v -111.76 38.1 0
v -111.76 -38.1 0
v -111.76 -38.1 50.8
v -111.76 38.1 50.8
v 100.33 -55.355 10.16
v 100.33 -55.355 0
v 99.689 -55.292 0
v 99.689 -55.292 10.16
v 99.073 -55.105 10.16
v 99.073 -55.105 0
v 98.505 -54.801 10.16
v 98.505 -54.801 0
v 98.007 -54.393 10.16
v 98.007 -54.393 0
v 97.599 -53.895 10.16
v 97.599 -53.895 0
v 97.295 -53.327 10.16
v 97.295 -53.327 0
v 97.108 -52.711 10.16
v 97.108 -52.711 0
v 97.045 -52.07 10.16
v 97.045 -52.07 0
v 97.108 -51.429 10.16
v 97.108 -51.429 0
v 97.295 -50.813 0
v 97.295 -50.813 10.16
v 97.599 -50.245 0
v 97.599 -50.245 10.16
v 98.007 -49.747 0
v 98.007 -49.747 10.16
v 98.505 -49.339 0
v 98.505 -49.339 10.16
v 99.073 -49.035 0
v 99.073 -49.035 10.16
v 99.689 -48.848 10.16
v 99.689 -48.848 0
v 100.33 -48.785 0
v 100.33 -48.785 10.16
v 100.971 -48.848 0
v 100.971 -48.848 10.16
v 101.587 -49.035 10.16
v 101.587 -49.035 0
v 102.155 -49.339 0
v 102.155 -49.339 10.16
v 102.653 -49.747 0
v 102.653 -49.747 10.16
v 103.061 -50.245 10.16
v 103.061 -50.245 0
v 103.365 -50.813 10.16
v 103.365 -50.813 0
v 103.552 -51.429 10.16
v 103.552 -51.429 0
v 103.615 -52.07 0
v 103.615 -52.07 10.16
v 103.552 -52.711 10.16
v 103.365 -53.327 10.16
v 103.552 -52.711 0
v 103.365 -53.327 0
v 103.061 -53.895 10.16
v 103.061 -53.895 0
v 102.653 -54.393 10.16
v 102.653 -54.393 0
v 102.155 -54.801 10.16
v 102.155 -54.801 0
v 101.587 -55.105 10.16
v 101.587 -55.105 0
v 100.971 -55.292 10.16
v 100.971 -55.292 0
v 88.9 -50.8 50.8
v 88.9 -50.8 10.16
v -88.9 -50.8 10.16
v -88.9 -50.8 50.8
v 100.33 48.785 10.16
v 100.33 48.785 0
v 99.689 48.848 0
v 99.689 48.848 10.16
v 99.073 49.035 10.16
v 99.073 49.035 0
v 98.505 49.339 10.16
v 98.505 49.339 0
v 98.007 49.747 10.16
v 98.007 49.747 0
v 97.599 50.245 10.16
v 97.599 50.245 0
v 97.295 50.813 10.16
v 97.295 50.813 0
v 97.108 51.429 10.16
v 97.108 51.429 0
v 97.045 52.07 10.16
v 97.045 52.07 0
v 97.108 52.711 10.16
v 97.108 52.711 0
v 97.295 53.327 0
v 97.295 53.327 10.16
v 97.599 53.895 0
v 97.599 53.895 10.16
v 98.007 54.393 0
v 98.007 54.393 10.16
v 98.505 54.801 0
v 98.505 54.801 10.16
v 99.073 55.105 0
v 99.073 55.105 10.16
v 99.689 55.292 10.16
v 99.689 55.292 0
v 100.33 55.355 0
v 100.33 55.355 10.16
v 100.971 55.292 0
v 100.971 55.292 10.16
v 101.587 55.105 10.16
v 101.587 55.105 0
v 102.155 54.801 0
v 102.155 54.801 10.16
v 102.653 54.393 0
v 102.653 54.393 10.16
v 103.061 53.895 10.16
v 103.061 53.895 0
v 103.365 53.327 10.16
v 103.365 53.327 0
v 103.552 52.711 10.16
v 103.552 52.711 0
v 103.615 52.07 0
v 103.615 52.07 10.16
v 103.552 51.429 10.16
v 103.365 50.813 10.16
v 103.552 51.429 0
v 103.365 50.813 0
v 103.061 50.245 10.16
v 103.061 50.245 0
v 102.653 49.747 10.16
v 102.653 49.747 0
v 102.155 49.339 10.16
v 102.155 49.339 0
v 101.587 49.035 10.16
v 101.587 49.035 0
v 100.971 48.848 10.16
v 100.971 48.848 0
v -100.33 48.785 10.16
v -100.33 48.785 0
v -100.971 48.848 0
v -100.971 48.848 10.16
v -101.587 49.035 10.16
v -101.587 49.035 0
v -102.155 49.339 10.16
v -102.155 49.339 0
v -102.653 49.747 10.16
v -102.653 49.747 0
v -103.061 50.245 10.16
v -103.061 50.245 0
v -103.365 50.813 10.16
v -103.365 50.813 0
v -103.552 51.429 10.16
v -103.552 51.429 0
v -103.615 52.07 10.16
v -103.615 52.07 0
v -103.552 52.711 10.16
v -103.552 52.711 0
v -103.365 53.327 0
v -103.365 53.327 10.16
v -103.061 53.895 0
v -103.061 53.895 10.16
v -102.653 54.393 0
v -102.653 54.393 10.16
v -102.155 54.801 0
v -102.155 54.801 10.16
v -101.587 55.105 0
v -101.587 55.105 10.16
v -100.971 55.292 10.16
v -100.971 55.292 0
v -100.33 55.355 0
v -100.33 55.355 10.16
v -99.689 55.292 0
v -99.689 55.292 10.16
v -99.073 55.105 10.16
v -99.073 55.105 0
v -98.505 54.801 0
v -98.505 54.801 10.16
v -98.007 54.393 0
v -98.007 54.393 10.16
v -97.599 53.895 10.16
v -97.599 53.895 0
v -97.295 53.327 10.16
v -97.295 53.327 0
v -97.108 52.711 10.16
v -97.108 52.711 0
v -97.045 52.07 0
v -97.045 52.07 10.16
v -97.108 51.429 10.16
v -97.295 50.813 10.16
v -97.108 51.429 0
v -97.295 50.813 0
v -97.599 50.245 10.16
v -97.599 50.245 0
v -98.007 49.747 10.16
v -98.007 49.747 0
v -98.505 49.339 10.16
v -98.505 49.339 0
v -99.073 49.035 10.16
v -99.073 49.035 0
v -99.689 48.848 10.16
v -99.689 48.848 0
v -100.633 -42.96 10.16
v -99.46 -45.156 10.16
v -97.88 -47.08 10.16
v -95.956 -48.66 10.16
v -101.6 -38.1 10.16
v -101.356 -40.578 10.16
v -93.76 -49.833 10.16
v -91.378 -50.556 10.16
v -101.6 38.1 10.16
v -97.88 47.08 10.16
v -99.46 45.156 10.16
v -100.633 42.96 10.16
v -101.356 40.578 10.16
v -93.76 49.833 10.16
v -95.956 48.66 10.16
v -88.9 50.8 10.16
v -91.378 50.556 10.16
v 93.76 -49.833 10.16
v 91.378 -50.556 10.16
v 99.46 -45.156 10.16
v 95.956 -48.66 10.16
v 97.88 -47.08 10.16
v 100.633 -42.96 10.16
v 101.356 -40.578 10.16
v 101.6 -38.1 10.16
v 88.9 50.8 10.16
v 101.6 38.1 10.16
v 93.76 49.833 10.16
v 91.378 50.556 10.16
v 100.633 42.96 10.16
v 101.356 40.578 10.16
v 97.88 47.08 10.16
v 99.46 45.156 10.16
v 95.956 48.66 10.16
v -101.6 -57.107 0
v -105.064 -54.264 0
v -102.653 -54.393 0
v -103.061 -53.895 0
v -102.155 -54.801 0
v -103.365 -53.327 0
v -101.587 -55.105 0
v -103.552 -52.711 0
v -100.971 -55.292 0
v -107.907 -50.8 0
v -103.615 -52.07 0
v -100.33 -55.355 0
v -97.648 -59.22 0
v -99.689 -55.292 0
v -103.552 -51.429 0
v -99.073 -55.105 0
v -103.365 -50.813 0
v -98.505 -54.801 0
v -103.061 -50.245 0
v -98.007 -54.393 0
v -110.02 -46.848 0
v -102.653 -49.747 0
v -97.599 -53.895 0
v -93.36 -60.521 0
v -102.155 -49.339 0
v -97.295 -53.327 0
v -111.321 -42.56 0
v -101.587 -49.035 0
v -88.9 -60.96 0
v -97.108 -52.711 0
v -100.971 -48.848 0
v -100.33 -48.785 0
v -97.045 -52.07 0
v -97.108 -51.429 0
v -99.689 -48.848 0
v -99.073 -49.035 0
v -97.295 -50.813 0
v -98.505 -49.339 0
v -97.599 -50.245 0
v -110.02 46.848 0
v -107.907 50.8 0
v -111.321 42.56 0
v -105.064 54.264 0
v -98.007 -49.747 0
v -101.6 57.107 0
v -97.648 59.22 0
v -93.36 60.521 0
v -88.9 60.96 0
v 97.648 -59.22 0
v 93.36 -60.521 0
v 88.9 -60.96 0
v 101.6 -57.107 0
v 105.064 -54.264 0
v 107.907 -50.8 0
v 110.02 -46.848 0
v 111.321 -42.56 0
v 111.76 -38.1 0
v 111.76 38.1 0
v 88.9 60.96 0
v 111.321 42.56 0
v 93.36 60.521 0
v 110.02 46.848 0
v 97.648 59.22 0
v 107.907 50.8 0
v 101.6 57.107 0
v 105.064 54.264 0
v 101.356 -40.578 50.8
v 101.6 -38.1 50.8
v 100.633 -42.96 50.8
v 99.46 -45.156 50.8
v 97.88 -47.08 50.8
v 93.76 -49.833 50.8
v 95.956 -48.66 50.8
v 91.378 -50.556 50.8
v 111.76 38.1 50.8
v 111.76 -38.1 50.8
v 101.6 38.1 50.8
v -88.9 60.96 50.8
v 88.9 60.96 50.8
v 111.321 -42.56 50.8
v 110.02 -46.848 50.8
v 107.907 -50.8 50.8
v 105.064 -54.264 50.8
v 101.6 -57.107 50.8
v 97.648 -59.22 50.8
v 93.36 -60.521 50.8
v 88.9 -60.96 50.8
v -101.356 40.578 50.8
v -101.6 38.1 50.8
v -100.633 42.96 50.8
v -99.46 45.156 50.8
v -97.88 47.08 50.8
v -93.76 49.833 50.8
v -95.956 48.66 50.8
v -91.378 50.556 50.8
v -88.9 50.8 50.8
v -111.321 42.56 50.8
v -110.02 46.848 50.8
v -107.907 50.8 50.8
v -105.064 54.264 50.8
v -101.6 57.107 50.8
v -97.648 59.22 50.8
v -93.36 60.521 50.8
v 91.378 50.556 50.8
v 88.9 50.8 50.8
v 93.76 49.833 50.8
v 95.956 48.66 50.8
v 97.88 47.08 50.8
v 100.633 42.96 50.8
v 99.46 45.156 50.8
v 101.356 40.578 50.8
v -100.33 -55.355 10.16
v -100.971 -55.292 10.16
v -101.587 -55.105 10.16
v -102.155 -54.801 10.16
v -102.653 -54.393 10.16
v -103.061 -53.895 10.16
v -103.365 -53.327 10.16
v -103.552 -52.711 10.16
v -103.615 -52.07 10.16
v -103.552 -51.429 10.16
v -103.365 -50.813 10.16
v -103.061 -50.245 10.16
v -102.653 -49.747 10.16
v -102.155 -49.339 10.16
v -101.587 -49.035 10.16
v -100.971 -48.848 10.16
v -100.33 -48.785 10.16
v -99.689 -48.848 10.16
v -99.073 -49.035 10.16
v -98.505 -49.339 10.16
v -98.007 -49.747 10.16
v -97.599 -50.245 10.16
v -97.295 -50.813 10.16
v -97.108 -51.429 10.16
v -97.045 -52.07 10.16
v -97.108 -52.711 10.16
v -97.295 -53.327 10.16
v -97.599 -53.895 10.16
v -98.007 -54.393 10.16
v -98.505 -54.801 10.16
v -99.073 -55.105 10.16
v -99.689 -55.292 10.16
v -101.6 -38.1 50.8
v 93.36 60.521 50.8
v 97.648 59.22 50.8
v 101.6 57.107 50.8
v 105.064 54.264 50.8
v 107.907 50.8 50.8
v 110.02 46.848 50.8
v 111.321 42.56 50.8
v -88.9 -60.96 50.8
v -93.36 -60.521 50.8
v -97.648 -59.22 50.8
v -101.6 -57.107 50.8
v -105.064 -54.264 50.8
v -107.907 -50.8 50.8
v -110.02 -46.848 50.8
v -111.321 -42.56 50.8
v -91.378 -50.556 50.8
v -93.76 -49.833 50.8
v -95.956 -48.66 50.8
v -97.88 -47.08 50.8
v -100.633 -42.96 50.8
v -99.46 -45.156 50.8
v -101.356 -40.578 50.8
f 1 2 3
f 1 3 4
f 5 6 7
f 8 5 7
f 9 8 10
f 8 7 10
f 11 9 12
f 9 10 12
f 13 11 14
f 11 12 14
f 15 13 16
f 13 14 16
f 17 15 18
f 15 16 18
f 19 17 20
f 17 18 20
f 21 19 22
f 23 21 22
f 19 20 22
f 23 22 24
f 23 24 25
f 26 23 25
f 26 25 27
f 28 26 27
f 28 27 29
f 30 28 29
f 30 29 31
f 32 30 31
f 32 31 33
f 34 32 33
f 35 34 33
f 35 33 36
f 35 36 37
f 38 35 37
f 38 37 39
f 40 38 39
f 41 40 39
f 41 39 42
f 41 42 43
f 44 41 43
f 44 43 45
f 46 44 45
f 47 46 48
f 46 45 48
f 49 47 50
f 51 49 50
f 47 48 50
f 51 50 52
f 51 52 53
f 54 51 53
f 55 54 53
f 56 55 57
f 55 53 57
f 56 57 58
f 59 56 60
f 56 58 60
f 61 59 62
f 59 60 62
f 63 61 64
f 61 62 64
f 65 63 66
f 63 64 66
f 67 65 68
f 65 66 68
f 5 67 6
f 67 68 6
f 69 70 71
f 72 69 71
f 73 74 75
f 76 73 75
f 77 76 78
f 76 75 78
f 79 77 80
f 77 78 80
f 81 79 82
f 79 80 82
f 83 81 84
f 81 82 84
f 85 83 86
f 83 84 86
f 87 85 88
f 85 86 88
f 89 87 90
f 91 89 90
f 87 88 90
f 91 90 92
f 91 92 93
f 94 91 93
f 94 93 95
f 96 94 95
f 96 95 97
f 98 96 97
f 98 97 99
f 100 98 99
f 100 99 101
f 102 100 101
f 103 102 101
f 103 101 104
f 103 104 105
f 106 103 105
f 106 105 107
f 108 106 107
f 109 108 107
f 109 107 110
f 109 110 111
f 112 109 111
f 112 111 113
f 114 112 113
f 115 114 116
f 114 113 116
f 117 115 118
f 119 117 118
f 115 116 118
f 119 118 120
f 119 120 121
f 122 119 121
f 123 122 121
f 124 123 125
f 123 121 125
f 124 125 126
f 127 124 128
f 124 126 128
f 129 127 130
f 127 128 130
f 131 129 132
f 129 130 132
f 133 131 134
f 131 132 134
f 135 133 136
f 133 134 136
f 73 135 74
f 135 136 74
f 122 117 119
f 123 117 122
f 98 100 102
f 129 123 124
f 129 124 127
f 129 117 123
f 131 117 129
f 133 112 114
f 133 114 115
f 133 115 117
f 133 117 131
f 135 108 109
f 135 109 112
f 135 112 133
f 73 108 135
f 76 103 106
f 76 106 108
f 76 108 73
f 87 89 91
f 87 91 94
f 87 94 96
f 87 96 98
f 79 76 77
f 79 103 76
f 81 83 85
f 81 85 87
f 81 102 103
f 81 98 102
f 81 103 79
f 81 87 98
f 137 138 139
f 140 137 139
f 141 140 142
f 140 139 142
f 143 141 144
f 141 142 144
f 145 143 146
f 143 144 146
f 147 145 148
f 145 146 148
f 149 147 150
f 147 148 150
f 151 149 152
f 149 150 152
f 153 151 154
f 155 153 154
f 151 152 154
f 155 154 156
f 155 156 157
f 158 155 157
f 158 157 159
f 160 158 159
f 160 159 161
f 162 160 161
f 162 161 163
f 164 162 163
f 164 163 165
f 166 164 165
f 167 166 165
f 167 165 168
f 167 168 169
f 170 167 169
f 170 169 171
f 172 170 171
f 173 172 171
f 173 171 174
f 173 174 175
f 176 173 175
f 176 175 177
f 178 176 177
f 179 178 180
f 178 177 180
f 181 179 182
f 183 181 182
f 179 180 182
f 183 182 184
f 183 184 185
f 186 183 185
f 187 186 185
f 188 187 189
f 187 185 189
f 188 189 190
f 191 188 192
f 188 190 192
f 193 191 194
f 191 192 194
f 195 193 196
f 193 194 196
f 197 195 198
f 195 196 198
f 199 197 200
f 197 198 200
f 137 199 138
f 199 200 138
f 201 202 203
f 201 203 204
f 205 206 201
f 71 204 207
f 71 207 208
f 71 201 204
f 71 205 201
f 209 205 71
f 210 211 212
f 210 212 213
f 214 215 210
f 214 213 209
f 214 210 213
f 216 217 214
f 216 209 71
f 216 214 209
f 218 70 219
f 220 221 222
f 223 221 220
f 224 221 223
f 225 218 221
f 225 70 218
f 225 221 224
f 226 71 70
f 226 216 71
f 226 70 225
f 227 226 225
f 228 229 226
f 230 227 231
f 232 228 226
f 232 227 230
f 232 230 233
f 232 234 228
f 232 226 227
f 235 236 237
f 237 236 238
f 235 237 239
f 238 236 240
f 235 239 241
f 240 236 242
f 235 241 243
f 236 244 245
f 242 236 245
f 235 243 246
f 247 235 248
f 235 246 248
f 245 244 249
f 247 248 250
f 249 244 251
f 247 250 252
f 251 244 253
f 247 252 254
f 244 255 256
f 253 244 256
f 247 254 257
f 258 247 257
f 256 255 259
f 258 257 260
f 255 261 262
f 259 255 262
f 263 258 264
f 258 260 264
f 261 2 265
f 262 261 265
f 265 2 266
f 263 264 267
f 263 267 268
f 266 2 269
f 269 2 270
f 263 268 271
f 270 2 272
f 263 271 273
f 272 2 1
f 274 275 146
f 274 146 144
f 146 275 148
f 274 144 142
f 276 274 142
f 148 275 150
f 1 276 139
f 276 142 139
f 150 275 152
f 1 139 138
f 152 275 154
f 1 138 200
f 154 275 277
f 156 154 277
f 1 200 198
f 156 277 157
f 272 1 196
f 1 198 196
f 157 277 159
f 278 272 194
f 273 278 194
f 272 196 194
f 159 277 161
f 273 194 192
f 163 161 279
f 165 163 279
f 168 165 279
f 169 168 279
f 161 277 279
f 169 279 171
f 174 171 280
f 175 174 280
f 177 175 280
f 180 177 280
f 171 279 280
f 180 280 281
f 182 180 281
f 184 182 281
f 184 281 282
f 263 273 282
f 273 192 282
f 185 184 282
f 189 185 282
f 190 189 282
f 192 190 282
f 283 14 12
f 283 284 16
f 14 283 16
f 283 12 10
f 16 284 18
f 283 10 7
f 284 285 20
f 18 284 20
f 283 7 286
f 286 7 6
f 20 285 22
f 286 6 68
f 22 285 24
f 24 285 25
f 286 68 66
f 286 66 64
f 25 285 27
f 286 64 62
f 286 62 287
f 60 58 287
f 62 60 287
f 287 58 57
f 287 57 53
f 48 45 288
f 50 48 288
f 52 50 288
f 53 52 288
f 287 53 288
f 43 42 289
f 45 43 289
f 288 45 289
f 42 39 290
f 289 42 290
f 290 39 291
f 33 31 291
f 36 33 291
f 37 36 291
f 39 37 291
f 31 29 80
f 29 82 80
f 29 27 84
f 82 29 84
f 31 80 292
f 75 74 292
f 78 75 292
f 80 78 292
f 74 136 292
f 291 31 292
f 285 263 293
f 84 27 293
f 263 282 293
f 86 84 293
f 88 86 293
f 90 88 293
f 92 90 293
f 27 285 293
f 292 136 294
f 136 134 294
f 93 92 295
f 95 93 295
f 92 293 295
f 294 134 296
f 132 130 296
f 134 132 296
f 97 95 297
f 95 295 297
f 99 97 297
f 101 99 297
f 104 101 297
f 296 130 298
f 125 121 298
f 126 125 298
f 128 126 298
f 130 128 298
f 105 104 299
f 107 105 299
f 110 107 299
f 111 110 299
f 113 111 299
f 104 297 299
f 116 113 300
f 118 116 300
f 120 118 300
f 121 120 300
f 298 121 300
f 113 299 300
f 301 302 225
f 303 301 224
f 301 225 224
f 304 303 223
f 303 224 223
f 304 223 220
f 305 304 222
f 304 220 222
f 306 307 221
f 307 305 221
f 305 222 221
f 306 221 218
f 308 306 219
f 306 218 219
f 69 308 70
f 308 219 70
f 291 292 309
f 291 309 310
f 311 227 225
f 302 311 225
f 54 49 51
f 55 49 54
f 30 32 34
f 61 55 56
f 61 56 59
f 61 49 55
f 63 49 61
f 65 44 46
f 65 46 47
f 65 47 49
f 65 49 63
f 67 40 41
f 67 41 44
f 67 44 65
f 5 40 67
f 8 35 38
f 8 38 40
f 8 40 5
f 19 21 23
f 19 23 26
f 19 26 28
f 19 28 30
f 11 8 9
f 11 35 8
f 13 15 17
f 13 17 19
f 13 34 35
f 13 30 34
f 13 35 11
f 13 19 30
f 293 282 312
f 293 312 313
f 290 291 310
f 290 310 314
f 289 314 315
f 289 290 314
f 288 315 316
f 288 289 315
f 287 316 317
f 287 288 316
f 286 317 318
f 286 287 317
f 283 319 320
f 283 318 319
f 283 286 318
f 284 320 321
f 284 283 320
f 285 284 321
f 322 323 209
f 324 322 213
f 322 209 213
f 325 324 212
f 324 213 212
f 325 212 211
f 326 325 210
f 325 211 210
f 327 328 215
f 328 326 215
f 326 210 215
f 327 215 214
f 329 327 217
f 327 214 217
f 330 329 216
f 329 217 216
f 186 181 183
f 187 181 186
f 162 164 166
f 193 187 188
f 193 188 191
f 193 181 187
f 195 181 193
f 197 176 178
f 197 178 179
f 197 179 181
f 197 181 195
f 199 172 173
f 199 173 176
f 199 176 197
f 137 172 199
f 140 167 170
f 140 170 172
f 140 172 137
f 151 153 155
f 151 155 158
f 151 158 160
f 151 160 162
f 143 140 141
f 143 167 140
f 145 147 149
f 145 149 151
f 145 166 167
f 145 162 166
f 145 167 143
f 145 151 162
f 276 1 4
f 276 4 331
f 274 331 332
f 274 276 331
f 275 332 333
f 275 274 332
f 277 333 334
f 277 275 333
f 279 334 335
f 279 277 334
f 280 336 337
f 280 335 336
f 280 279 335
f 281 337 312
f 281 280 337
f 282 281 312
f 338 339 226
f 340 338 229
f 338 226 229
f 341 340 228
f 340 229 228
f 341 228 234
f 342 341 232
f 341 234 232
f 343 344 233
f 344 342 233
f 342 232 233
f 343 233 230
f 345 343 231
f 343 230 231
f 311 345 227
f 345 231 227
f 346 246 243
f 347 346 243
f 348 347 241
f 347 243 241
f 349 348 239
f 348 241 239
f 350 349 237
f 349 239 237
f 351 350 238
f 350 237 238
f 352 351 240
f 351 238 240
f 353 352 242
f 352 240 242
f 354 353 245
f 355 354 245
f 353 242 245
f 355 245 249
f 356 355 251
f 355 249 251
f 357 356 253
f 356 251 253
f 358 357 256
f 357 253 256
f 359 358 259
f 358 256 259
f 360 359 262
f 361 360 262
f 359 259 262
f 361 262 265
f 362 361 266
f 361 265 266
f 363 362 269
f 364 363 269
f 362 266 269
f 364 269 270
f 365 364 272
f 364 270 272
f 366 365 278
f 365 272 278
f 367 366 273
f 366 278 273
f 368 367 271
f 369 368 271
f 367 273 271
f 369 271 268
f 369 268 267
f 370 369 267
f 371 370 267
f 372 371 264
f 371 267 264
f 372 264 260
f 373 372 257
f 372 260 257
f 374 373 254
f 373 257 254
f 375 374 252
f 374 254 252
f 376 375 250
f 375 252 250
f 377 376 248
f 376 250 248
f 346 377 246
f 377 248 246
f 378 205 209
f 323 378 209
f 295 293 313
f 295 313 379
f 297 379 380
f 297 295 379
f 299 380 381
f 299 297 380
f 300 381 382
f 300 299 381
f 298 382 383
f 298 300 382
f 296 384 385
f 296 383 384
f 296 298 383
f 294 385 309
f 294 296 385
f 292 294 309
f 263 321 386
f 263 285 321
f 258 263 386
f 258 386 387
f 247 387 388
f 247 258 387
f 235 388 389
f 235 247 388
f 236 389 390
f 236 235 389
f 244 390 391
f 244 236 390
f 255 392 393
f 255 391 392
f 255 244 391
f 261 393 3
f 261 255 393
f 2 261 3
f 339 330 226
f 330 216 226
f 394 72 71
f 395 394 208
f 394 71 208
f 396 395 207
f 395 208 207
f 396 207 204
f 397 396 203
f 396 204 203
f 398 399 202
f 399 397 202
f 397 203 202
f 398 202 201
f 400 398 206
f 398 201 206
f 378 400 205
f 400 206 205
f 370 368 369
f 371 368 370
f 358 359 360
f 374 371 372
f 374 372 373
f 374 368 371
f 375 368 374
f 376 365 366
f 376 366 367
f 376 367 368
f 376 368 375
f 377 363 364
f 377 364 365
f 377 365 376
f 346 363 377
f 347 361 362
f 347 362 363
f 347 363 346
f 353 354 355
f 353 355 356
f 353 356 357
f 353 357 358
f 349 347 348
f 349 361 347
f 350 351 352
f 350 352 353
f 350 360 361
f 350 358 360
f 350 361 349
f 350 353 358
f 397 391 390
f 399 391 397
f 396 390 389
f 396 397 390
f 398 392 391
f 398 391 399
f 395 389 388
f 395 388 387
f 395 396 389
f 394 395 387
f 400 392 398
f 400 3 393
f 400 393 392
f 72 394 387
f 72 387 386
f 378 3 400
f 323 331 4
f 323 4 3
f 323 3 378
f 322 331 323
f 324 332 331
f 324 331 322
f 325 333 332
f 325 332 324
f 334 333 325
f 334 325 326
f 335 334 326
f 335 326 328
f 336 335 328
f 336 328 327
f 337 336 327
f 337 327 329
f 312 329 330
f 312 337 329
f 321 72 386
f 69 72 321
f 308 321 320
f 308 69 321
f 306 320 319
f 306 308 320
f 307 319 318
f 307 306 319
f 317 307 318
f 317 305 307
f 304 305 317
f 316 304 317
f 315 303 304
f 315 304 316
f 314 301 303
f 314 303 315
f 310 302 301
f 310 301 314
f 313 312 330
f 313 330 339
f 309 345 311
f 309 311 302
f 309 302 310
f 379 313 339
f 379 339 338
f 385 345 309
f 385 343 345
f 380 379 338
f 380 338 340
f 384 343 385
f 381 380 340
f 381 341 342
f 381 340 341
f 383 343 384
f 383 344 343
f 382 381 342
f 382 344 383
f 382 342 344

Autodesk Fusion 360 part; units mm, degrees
sketch "Sketch1" plane through (0, 0, 0) normal (0, 0, 1) x (1, 0, 0) in component "Box"
  line L0 (88.9, -50.8) -> (-88.9, -50.8)
  line L1 (-101.6, -38.1) -> (-101.6, 38.1)
  line L2 (-88.9, 50.8) -> (88.9, 50.8)
  line L3 (101.6, 38.1) -> (101.6, -38.1)
  line L4 (101.6, -50.8) -> (-101.6, 50.8) construction
  line L5 (-101.6, -50.8) -> (101.6, 50.8) construction
  arc A0 (-88.9, 50.8) -> (-101.6, 38.1) centre (-88.9, 38.1) ccw
  arc A1 (101.6, 38.1) -> (88.9, 50.8) centre (88.9, 38.1) ccw
  arc A2 (88.9, -50.8) -> (101.6, -38.1) centre (88.9, -38.1) ccw
  arc A3 (-101.6, -38.1) -> (-88.9, -50.8) centre (-88.9, -38.1) ccw
  arc A4 (111.76, 38.1) -> (88.9, 60.96) centre (88.9, 38.1) ccw
  line L6 (-88.9, 60.96) -> (88.9, 60.96)
  arc A5 (-88.9, 60.96) -> (-111.76, 38.1) centre (-88.9, 38.1) ccw
  line L7 (-111.76, -38.1) -> (-111.76, 38.1)
  arc A6 (-111.76, -38.1) -> (-88.9, -60.96) centre (-88.9, -38.1) ccw
  line L8 (88.9, -60.96) -> (-88.9, -60.96)
  arc A7 (88.9, -60.96) -> (111.76, -38.1) centre (88.9, -38.1) ccw
  line L9 (111.76, 38.1) -> (111.76, -38.1)
  dimension "d1" = 203.2
  dimension "d2" = 101.6
  dimension "d3" = 12.7
  dimension "d4" = -10.16
extrude "Extrude1" add sketch "Sketch1" along normal blind 50.8 makes body 1 in component "Screew"
copy_body "CutPasteBodies1" bodies 1 removing the originals makes body 2 in component "Box"
extrude "Extrude1'" add sketch "Sketch1" along normal blind 10.16 contours L0 L1 L2 L3 A0 A1 A2 A3 bodies 2 in component "Box"
sketch "Sketch1 (1)" plane through (0, 0, 10.16) normal (0, 0, 1) x (-1, 0, 0) in component "Box"
  arc A0 (88.9, -50.8) -> (101.6, -38.1) centre (88.9, -38.1) ccw
  line L0 (101.6, -38.1) -> (101.6, 38.1)
  arc A1 (101.6, 38.1) -> (88.9, 50.8) centre (88.9, 38.1) ccw
  line L1 (88.9, 50.8) -> (-88.9, 50.8)
  arc A2 (-88.9, 50.8) -> (-101.6, 38.1) centre (-88.9, 38.1) ccw
  line L2 (-101.6, 38.1) -> (-101.6, -38.1)
  arc A3 (-101.6, -38.1) -> (-88.9, -50.8) centre (-88.9, -38.1) ccw
  line L3 (-88.9, -50.8) -> (88.9, -50.8)
  line L4 (100.33, 52.07) -> (-100.33, 52.07)
  line L5 (-100.33, 52.07) -> (-100.33, -52.07)
  line L6 (-100.33, -52.07) -> (100.33, -52.07)
  line L7 (100.33, -52.07) -> (100.33, 52.07)
  line L8 (100.33, 52.07) -> (-100.33, -52.07) construction
  line L9 (-100.33, 52.07) -> (100.33, -52.07) construction
  dimension "d9" = 200.66
  dimension "d10" = 104.14
hole "Hole1" at (100.33, 52.07, 10.16) at (100.33, -52.07, 10.16) at (-100.33, -52.07, 10.16) at (-100.33, 52.07, 10.16) direction (0, 0, -1) diameter 6.57 depth 25.4 tip angle 118 bodies 2 in component "Box"
component "Lid" placed x (1, 0, 0) y (0, 1, 0) z (0, 0, 1) at (0, 0, 0)
component "Box" placed x (1, 0, 0) y (0, 1, 0) z (0, 0, 1) at (0, 0, 0)
component "Screew" placed x (1, 0, 0) y (0, 1, 0) z (0, 0, 1) at (0, 0, 0)
